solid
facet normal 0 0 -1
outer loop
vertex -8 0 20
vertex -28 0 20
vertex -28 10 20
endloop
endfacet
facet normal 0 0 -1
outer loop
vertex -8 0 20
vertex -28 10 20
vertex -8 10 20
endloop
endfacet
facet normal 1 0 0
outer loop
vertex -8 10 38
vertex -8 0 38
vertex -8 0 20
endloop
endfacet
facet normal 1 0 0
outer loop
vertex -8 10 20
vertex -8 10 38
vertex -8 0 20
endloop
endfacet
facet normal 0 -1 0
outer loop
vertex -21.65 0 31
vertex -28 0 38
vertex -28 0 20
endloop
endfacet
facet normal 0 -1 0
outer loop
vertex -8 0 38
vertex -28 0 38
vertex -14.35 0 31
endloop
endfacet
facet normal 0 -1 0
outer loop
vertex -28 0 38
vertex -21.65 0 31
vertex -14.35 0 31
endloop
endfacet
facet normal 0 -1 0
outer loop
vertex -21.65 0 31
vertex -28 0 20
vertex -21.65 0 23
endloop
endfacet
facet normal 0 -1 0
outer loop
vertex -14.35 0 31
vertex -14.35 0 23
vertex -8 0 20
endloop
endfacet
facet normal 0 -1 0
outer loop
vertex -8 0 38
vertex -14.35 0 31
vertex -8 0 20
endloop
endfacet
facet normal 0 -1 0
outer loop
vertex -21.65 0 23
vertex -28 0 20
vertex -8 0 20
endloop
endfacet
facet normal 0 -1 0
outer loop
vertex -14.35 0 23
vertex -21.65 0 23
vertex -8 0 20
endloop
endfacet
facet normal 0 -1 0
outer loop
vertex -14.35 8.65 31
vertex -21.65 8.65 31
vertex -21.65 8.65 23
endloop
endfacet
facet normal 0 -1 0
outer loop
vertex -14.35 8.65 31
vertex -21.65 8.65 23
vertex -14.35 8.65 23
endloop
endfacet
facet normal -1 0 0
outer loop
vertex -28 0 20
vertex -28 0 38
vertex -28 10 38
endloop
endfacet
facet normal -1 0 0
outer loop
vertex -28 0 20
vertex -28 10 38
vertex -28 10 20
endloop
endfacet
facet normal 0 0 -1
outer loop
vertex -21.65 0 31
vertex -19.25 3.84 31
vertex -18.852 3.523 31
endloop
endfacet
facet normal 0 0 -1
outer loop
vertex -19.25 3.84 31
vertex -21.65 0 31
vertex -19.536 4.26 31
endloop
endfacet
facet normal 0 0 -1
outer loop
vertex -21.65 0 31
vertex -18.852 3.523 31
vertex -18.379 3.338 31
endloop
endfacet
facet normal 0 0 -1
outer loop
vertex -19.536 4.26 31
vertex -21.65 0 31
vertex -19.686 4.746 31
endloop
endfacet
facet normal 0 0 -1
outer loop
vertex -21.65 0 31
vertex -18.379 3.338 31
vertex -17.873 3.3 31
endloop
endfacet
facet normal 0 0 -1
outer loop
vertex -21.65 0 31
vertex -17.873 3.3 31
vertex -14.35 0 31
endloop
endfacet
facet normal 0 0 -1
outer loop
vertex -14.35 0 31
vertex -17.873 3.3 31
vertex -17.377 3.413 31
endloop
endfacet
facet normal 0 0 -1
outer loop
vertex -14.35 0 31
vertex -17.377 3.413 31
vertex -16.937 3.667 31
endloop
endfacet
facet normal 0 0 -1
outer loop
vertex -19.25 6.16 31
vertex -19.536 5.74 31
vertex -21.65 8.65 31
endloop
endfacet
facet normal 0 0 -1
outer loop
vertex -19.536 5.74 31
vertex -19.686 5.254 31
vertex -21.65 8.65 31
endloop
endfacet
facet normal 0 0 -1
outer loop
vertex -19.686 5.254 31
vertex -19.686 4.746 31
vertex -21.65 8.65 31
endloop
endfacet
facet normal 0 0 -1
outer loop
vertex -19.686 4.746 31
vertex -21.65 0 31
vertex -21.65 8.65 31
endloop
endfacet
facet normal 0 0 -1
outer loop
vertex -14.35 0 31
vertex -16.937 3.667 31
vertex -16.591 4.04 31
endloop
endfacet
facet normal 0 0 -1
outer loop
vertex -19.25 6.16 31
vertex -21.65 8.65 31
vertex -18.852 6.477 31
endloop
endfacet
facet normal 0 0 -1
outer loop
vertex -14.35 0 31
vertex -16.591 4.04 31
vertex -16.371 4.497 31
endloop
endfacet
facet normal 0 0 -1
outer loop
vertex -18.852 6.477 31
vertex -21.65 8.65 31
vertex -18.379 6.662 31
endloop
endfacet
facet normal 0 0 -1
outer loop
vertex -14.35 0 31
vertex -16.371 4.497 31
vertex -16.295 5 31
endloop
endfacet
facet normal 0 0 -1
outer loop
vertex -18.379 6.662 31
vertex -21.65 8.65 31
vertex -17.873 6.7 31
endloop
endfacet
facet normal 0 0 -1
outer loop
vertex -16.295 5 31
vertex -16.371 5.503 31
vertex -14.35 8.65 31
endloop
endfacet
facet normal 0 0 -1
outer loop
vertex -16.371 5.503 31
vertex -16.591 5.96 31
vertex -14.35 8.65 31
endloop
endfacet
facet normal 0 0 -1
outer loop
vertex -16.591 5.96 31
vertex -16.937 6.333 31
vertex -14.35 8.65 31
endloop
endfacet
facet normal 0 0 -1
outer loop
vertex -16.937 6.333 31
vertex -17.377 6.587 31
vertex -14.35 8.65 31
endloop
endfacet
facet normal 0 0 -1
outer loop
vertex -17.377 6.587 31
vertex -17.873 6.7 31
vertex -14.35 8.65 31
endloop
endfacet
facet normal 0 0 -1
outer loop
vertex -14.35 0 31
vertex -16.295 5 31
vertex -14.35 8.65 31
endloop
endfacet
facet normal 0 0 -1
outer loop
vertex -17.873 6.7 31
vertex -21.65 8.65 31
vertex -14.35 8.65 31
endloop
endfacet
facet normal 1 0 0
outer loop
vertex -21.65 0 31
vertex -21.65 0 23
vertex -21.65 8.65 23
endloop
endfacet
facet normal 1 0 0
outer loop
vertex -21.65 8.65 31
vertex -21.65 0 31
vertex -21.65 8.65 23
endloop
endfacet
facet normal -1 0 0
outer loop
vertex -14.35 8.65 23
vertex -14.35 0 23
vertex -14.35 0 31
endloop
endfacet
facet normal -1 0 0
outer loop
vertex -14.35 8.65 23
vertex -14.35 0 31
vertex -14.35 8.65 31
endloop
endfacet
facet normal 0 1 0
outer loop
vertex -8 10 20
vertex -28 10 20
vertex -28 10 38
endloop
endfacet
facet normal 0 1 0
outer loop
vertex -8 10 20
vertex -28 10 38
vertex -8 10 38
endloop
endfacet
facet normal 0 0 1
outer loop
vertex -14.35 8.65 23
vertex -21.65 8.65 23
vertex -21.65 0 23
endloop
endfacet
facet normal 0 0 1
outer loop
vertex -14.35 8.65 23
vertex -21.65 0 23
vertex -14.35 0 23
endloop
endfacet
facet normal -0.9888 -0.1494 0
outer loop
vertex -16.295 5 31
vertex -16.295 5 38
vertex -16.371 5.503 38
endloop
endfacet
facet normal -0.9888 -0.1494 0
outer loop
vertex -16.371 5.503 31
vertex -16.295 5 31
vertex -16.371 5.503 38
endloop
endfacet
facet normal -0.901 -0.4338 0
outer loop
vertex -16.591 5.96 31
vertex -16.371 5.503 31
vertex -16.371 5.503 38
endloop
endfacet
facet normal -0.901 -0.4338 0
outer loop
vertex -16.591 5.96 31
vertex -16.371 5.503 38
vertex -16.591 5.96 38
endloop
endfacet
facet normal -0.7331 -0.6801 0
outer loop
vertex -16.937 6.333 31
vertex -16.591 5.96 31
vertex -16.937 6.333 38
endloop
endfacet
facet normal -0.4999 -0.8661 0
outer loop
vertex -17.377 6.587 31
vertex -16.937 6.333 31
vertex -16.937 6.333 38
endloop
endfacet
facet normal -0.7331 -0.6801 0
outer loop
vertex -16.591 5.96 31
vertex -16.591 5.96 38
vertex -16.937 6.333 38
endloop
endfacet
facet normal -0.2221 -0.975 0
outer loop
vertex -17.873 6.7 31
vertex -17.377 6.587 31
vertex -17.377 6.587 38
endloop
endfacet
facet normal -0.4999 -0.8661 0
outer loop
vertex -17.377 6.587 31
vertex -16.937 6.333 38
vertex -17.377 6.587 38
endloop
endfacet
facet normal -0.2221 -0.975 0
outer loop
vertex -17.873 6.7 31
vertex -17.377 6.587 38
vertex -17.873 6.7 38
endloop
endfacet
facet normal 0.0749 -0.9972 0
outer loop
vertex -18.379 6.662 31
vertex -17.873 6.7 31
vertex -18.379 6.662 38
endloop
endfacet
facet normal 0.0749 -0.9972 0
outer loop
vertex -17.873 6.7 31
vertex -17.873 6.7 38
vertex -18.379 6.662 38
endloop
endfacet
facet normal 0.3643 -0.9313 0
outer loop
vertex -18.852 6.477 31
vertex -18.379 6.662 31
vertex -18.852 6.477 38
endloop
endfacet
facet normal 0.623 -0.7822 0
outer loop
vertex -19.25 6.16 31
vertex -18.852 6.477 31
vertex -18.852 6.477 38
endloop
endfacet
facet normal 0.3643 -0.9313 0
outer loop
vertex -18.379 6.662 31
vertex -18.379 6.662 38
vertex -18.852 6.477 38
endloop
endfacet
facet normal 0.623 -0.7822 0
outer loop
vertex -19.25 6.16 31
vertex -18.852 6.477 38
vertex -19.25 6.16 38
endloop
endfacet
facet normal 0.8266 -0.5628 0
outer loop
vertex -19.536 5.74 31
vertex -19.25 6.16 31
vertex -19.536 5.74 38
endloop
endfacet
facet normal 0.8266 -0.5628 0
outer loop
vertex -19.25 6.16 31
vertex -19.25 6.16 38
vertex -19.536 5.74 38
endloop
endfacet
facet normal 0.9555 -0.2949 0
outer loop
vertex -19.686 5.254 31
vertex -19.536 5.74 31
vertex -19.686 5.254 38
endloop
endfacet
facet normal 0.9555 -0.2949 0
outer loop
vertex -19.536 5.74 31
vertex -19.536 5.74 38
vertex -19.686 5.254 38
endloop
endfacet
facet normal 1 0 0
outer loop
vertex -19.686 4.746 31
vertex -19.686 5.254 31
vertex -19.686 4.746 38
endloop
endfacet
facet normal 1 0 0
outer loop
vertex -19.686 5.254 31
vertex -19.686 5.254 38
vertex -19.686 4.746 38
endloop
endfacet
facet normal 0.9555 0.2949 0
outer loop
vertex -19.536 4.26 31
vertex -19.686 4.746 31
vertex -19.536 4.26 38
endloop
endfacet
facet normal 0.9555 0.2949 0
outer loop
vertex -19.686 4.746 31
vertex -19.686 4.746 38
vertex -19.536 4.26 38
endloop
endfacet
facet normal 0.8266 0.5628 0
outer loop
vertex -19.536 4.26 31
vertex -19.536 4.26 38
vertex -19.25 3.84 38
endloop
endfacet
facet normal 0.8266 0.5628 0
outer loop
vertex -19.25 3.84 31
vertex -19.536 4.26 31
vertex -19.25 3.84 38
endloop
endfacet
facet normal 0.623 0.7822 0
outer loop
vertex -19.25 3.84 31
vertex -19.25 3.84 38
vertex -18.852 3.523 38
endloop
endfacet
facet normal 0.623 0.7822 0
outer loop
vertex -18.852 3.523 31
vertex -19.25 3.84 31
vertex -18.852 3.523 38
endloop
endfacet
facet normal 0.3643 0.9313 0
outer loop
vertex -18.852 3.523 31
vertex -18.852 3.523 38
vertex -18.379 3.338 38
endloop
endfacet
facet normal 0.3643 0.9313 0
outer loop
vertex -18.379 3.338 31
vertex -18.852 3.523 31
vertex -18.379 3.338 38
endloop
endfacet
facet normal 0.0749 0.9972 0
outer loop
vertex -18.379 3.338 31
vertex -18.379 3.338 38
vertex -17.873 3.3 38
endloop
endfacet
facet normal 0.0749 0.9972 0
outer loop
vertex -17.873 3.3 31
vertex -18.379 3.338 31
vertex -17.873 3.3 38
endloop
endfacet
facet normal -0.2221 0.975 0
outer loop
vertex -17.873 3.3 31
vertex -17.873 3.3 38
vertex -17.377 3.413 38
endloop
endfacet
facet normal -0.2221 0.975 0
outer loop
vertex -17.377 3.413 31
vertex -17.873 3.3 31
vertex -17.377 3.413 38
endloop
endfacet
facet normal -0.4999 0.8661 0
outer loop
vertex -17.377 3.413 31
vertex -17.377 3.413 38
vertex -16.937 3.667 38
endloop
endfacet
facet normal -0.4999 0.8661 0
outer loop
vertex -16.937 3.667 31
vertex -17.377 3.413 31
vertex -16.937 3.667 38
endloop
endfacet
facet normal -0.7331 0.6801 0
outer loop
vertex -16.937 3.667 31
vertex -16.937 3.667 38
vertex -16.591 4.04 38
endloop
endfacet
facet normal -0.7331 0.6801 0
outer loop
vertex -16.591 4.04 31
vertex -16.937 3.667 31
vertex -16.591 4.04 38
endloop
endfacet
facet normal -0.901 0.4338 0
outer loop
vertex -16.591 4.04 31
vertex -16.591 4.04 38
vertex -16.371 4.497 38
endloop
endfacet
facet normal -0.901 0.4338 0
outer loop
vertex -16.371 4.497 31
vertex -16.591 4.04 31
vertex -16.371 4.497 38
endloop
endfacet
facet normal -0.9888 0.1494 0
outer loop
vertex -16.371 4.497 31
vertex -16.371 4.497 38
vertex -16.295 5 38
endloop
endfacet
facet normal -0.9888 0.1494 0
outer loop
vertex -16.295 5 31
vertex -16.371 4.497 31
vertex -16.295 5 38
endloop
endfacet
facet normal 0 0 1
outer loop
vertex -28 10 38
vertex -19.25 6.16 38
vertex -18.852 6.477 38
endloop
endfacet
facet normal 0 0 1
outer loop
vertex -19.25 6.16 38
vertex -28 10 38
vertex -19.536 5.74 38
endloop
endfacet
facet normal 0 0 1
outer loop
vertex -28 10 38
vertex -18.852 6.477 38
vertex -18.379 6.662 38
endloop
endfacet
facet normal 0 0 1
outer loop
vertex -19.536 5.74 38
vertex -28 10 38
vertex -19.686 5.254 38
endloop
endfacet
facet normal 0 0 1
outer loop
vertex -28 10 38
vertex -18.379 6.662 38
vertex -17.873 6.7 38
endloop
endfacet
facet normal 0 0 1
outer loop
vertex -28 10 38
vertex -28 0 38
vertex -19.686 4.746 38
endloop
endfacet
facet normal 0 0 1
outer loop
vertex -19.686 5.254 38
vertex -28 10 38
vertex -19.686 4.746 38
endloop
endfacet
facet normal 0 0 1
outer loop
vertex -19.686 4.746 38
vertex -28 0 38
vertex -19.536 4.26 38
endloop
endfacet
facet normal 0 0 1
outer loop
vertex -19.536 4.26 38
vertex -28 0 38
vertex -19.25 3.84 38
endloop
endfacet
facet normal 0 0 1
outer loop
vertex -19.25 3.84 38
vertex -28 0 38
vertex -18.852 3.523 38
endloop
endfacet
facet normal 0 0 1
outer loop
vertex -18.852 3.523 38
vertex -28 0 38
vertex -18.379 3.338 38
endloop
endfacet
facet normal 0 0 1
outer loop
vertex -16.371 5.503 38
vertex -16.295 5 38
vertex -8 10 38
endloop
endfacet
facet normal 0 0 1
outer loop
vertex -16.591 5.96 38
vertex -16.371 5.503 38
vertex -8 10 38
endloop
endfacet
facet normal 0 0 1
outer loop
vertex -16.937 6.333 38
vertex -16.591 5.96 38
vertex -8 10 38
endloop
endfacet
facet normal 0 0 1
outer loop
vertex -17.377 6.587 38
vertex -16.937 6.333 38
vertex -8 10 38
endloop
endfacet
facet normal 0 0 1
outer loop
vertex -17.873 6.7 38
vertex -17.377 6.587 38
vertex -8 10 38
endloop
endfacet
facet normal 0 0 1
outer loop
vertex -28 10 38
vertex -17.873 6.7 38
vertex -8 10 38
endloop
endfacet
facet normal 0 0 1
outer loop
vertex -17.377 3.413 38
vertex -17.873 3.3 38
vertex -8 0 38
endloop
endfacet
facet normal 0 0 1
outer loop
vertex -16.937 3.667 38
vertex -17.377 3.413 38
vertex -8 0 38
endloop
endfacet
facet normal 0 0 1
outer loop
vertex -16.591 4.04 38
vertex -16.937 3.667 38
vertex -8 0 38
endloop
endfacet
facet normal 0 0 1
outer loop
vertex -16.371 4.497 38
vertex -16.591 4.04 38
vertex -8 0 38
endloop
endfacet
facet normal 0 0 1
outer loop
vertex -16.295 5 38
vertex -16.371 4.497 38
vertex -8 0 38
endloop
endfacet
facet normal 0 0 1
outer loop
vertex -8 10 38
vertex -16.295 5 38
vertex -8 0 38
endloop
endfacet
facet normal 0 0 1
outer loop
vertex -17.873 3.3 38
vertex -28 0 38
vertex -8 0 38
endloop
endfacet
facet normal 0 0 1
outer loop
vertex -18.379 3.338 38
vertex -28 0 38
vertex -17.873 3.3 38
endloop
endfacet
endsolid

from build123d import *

# Parameters (mm, degrees)
SKETCH1_W           = 20
SKETCH1_H           = 18
BOSS_EXTRUDE1_DEPTH = 10
SKETCH2_R           = 1.705
CUT_EXTRUDE1_DEPTH  = 15
SKETCH3_W           = 7.3
SKETCH3_H           = 8.65
CUT_EXTRUDE2_DEPTH  = 8


with BuildPart() as part:
    # Sketch1 → Boss-Extrude1 (new body)
    with BuildSketch(Plane(origin=(0, 0, 0), x_dir=(1, 0, 0), z_dir=(0, 1, 0))):
        with Locations((-18, -29)):
            Rectangle(SKETCH1_W, SKETCH1_H)
    extrude(amount=BOSS_EXTRUDE1_DEPTH)

    # Sketch2 → Cut-Extrude1 (cut)
    with BuildSketch(Plane.XY.offset(38)):
        with Locations((-18, 5)):
            Circle(SKETCH2_R)
    extrude(amount=-CUT_EXTRUDE1_DEPTH, mode=Mode.SUBTRACT)

    # Sketch3 → Cut-Extrude2 (cut)
    with BuildSketch(Plane.XY.offset(23)):
        with Locations((-18, 4.325)):
            Rectangle(SKETCH3_W, SKETCH3_H)
    extrude(amount=CUT_EXTRUDE2_DEPTH, mode=Mode.SUBTRACT)


solid = part.part
